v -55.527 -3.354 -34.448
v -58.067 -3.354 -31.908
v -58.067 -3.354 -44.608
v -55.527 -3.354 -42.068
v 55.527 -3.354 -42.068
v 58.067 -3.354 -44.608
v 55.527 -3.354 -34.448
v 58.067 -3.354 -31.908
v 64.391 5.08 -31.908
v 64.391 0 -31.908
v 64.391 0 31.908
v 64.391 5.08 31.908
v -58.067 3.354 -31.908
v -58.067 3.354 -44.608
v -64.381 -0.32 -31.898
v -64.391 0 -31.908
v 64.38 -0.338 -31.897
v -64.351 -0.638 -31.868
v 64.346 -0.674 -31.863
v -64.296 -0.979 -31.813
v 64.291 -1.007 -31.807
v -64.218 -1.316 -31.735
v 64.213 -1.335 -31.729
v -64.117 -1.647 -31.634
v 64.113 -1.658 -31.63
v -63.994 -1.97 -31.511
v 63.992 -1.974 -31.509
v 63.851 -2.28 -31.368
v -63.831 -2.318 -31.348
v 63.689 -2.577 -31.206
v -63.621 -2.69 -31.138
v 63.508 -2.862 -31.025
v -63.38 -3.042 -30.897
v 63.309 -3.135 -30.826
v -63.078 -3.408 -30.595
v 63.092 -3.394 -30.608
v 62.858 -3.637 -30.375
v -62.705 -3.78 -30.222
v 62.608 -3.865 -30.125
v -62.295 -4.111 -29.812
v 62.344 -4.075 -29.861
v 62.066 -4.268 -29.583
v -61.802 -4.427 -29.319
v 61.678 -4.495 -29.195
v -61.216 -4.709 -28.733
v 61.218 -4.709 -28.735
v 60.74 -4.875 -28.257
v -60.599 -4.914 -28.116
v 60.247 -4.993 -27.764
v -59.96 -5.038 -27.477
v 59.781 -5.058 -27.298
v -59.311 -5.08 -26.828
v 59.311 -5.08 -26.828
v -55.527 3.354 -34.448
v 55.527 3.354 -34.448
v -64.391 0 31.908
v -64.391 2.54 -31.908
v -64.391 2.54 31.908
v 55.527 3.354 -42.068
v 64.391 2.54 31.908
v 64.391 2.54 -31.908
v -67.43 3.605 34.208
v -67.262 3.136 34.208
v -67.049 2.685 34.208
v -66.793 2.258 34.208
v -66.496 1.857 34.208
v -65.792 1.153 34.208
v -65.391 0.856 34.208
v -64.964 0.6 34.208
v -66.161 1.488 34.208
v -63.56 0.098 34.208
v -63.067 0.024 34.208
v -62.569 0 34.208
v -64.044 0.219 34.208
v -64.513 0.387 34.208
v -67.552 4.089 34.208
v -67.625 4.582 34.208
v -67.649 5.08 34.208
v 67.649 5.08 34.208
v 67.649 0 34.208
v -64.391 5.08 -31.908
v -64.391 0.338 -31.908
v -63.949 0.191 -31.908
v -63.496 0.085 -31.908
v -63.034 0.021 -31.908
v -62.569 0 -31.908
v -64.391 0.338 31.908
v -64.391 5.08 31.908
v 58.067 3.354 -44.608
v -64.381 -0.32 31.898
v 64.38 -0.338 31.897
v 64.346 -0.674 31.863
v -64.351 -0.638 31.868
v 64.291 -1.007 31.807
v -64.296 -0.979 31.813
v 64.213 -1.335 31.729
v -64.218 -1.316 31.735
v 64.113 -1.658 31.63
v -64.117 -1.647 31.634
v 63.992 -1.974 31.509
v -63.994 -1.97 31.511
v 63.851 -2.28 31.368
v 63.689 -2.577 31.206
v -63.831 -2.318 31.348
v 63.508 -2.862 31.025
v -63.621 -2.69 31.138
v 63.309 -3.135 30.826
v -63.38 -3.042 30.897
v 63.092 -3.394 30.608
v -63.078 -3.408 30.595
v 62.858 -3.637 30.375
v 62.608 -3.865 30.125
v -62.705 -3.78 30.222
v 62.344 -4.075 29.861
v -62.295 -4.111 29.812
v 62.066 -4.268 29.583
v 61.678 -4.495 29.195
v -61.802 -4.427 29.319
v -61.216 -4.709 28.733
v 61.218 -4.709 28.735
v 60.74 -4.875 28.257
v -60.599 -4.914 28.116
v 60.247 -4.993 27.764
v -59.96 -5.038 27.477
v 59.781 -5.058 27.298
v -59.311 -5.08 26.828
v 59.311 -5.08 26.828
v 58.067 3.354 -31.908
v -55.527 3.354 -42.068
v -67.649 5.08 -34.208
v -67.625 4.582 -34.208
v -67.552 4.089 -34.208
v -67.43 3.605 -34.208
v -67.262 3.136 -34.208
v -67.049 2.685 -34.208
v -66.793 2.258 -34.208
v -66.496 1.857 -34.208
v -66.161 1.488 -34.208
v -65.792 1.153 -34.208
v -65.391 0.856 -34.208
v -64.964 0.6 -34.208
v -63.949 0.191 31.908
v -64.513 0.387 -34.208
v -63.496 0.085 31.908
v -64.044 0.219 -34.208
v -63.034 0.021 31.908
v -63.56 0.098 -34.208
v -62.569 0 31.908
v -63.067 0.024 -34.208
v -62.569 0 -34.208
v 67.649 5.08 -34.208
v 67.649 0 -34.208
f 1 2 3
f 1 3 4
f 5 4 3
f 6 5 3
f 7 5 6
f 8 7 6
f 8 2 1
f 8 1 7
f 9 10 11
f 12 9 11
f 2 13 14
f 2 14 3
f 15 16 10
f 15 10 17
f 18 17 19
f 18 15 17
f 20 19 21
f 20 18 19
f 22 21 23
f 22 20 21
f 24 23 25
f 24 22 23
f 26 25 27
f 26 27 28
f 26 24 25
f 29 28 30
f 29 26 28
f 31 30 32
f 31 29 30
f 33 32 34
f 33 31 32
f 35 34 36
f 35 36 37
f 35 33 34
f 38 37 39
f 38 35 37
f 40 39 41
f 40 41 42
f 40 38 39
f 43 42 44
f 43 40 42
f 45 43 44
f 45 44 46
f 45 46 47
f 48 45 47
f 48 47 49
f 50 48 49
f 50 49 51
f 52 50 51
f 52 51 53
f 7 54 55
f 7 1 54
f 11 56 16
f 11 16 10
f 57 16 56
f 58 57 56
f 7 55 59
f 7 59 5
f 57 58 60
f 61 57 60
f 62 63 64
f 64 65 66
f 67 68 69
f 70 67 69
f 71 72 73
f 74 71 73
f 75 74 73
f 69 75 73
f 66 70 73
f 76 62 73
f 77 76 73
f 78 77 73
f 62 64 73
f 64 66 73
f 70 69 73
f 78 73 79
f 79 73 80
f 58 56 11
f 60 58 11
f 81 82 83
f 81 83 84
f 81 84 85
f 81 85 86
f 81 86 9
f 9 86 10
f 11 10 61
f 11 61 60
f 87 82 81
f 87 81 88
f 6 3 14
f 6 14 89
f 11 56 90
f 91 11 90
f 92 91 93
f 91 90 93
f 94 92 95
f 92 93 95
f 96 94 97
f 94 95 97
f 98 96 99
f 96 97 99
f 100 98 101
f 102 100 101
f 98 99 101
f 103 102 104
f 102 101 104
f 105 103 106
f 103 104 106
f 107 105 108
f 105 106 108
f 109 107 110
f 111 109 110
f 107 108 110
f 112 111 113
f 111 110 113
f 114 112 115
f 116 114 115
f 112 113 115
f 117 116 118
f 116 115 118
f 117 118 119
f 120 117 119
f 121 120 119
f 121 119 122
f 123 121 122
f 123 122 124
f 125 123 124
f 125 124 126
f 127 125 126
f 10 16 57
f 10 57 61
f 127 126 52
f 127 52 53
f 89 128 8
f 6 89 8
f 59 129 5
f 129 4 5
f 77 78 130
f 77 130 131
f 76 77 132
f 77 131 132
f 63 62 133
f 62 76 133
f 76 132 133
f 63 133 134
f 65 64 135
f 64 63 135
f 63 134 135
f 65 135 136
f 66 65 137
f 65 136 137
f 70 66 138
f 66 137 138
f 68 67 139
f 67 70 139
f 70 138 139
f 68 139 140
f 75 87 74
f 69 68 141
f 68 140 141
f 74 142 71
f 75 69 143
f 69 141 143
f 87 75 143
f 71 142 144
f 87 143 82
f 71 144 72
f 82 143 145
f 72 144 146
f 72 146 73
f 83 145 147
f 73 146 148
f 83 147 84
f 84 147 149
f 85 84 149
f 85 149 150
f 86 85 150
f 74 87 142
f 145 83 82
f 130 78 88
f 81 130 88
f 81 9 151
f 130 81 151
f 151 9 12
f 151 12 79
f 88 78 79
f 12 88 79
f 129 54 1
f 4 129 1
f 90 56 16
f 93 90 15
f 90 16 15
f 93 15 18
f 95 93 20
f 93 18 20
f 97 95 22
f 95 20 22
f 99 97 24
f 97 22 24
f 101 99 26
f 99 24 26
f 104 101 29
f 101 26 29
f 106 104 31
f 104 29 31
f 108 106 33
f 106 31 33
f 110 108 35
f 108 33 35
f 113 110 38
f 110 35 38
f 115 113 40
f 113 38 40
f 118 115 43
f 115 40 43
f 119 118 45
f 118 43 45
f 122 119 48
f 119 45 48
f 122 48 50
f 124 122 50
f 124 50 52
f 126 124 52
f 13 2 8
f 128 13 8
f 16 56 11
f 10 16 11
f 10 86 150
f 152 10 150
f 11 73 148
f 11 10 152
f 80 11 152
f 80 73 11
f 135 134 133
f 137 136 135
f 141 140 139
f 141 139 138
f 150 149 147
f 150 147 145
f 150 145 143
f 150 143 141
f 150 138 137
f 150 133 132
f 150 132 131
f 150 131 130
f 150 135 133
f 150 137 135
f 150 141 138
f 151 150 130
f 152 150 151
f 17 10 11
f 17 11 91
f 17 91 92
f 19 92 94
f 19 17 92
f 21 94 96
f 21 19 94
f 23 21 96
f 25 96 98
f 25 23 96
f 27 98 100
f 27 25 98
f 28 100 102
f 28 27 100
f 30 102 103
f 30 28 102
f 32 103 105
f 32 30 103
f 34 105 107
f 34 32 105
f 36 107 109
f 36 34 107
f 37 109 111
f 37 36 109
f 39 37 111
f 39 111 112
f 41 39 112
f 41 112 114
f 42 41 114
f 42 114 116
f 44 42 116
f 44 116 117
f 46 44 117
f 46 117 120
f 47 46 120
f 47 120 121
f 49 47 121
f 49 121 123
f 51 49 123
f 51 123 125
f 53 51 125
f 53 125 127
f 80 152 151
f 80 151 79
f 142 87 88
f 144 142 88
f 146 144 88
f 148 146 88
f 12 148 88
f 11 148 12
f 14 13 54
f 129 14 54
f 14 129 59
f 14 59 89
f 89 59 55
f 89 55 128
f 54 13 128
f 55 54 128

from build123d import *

# Parameters (mm, degrees)
F0_W          = 128.7825703621
F0_H          = 63.8163611293
F1_DEPTH      = 5.08
F0_W_2        = 135.2983415127
F0_H_2        = 68.4157386422
F2_DEPTH      = 5.08
F3_W          = 116.1342710257
F3_H          = 6.7074256949
F4_DEPTH      = 12.7
F5_T          = -2.54
F6_T1_DEPTH   = 89.2163611293
F6_T3_DEPTH   = 154.1825703621
F6_2_T1_DEPTH = 93.8157386422
F7_DEPTH      = 2.54


# Not quite as in the source:
# - a fillet or chamfer that OpenCascade refuses, or shapes differently, is made with other operations: its cross-section is extruded or revolved along the edge and cut away or added


with BuildPart() as f1:
    # F0 (on Front) → F1 (new body)
    with BuildSketch(Plane.XZ):
        Rectangle(F0_W, F0_H)
    extrude(amount=F1_DEPTH)

    # F6: fillet of radius 5.08 on 4 edges, made by hand

    # F6_s2 → F6_t1 (cut)
    with BuildSketch(Plane.XY.offset(-44.6081805646)):
        with BuildLine():
            ThreePointArc((64.391285181, 0), (62.9033876295, -3.5921024484), (59.311285181, -5.08))
            Line((59.311285181, -5.08), (64.391285181, -5.08))
            Line((64.391285181, -5.08), (64.391285181, 0))
        make_face()
        with BuildLine():
            ThreePointArc((-64.391285181, 0), (-62.9033876295, -3.5921024484), (-59.311285181, -5.08))
            Line((-59.311285181, -5.08), (-64.391285181, -5.08))
            Line((-64.391285181, -5.08), (-64.391285181, 0))
        make_face()
    extrude(amount=F6_T1_DEPTH, mode=Mode.SUBTRACT)

    # F6_s4 → F6_t3 (cut)
    with BuildSketch(Plane.YZ.offset(-77.091285181)):
        with BuildLine():
            ThreePointArc((0, 31.9081805646), (-3.5921024484, 30.4202830131), (-5.08, 26.8281805646))
            Line((-5.08, 26.8281805646), (-5.08, 31.9081805646))
            Line((-5.08, 31.9081805646), (0, 31.9081805646))
        make_face()
        with BuildLine():
            ThreePointArc((0, -31.9081805646), (-3.5921024484, -30.4202830131), (-5.08, -26.8281805646))
            Line((-5.08, -26.8281805646), (-5.08, -31.9081805646))
            Line((-5.08, -31.9081805646), (0, -31.9081805646))
        make_face()
    extrude(amount=F6_T3_DEPTH, mode=Mode.SUBTRACT)


with BuildPart() as f2:
    # F0 (on Front) → F2 (new body)
    with BuildSketch(Plane.XZ):
        Rectangle(F0_W_2, F0_H_2)
        Rectangle(F0_W, F0_H, mode=Mode.SUBTRACT)
    extrude(amount=-F2_DEPTH)

    # F6#2: fillet of radius 5.08 on 1 edges, made by hand

    # F6_2_s2 → F6_2_t1 (cut)
    with BuildSketch(Plane.XY.offset(-46.9078693211)):
        with BuildLine():
            ThreePointArc((-67.6491707563, 5.08), (-66.1612732048, 1.4878975516), (-62.5691707563, 0))
            Line((-62.5691707563, 0), (-67.6491707563, 0))
            Line((-67.6491707563, 0), (-67.6491707563, 5.08))
        make_face()
    extrude(amount=F6_2_T1_DEPTH, mode=Mode.SUBTRACT)


with BuildPart() as f4:
    # F3 (on face) → F4 (new body)
    with BuildSketch(Plane(origin=(0, 0, -31.9081805646), x_dir=(1, 0, 0), z_dir=(0, 0, -1))):
        Rectangle(F3_W, F3_H)
    extrude(amount=F4_DEPTH)

    # F5
    f5_openings = [f4.faces().sort_by_distance(p)[0] for p in [
        (0, 3.353713, -38.258181),
        (0, -3.353713, -38.258181),
    ]]
    offset(amount=F5_T, openings=f5_openings)


with BuildPart() as f7:
    # F7 (new): a face of the model
    f7_faces = [f1.part.faces().sort_by_distance(p)[0] for p in [
        (0, 0, 0),
    ]]
    extrude(f7_faces, amount=F7_DEPTH)


solid = Compound([f1.part, f2.part, f4.part, f7.part])
